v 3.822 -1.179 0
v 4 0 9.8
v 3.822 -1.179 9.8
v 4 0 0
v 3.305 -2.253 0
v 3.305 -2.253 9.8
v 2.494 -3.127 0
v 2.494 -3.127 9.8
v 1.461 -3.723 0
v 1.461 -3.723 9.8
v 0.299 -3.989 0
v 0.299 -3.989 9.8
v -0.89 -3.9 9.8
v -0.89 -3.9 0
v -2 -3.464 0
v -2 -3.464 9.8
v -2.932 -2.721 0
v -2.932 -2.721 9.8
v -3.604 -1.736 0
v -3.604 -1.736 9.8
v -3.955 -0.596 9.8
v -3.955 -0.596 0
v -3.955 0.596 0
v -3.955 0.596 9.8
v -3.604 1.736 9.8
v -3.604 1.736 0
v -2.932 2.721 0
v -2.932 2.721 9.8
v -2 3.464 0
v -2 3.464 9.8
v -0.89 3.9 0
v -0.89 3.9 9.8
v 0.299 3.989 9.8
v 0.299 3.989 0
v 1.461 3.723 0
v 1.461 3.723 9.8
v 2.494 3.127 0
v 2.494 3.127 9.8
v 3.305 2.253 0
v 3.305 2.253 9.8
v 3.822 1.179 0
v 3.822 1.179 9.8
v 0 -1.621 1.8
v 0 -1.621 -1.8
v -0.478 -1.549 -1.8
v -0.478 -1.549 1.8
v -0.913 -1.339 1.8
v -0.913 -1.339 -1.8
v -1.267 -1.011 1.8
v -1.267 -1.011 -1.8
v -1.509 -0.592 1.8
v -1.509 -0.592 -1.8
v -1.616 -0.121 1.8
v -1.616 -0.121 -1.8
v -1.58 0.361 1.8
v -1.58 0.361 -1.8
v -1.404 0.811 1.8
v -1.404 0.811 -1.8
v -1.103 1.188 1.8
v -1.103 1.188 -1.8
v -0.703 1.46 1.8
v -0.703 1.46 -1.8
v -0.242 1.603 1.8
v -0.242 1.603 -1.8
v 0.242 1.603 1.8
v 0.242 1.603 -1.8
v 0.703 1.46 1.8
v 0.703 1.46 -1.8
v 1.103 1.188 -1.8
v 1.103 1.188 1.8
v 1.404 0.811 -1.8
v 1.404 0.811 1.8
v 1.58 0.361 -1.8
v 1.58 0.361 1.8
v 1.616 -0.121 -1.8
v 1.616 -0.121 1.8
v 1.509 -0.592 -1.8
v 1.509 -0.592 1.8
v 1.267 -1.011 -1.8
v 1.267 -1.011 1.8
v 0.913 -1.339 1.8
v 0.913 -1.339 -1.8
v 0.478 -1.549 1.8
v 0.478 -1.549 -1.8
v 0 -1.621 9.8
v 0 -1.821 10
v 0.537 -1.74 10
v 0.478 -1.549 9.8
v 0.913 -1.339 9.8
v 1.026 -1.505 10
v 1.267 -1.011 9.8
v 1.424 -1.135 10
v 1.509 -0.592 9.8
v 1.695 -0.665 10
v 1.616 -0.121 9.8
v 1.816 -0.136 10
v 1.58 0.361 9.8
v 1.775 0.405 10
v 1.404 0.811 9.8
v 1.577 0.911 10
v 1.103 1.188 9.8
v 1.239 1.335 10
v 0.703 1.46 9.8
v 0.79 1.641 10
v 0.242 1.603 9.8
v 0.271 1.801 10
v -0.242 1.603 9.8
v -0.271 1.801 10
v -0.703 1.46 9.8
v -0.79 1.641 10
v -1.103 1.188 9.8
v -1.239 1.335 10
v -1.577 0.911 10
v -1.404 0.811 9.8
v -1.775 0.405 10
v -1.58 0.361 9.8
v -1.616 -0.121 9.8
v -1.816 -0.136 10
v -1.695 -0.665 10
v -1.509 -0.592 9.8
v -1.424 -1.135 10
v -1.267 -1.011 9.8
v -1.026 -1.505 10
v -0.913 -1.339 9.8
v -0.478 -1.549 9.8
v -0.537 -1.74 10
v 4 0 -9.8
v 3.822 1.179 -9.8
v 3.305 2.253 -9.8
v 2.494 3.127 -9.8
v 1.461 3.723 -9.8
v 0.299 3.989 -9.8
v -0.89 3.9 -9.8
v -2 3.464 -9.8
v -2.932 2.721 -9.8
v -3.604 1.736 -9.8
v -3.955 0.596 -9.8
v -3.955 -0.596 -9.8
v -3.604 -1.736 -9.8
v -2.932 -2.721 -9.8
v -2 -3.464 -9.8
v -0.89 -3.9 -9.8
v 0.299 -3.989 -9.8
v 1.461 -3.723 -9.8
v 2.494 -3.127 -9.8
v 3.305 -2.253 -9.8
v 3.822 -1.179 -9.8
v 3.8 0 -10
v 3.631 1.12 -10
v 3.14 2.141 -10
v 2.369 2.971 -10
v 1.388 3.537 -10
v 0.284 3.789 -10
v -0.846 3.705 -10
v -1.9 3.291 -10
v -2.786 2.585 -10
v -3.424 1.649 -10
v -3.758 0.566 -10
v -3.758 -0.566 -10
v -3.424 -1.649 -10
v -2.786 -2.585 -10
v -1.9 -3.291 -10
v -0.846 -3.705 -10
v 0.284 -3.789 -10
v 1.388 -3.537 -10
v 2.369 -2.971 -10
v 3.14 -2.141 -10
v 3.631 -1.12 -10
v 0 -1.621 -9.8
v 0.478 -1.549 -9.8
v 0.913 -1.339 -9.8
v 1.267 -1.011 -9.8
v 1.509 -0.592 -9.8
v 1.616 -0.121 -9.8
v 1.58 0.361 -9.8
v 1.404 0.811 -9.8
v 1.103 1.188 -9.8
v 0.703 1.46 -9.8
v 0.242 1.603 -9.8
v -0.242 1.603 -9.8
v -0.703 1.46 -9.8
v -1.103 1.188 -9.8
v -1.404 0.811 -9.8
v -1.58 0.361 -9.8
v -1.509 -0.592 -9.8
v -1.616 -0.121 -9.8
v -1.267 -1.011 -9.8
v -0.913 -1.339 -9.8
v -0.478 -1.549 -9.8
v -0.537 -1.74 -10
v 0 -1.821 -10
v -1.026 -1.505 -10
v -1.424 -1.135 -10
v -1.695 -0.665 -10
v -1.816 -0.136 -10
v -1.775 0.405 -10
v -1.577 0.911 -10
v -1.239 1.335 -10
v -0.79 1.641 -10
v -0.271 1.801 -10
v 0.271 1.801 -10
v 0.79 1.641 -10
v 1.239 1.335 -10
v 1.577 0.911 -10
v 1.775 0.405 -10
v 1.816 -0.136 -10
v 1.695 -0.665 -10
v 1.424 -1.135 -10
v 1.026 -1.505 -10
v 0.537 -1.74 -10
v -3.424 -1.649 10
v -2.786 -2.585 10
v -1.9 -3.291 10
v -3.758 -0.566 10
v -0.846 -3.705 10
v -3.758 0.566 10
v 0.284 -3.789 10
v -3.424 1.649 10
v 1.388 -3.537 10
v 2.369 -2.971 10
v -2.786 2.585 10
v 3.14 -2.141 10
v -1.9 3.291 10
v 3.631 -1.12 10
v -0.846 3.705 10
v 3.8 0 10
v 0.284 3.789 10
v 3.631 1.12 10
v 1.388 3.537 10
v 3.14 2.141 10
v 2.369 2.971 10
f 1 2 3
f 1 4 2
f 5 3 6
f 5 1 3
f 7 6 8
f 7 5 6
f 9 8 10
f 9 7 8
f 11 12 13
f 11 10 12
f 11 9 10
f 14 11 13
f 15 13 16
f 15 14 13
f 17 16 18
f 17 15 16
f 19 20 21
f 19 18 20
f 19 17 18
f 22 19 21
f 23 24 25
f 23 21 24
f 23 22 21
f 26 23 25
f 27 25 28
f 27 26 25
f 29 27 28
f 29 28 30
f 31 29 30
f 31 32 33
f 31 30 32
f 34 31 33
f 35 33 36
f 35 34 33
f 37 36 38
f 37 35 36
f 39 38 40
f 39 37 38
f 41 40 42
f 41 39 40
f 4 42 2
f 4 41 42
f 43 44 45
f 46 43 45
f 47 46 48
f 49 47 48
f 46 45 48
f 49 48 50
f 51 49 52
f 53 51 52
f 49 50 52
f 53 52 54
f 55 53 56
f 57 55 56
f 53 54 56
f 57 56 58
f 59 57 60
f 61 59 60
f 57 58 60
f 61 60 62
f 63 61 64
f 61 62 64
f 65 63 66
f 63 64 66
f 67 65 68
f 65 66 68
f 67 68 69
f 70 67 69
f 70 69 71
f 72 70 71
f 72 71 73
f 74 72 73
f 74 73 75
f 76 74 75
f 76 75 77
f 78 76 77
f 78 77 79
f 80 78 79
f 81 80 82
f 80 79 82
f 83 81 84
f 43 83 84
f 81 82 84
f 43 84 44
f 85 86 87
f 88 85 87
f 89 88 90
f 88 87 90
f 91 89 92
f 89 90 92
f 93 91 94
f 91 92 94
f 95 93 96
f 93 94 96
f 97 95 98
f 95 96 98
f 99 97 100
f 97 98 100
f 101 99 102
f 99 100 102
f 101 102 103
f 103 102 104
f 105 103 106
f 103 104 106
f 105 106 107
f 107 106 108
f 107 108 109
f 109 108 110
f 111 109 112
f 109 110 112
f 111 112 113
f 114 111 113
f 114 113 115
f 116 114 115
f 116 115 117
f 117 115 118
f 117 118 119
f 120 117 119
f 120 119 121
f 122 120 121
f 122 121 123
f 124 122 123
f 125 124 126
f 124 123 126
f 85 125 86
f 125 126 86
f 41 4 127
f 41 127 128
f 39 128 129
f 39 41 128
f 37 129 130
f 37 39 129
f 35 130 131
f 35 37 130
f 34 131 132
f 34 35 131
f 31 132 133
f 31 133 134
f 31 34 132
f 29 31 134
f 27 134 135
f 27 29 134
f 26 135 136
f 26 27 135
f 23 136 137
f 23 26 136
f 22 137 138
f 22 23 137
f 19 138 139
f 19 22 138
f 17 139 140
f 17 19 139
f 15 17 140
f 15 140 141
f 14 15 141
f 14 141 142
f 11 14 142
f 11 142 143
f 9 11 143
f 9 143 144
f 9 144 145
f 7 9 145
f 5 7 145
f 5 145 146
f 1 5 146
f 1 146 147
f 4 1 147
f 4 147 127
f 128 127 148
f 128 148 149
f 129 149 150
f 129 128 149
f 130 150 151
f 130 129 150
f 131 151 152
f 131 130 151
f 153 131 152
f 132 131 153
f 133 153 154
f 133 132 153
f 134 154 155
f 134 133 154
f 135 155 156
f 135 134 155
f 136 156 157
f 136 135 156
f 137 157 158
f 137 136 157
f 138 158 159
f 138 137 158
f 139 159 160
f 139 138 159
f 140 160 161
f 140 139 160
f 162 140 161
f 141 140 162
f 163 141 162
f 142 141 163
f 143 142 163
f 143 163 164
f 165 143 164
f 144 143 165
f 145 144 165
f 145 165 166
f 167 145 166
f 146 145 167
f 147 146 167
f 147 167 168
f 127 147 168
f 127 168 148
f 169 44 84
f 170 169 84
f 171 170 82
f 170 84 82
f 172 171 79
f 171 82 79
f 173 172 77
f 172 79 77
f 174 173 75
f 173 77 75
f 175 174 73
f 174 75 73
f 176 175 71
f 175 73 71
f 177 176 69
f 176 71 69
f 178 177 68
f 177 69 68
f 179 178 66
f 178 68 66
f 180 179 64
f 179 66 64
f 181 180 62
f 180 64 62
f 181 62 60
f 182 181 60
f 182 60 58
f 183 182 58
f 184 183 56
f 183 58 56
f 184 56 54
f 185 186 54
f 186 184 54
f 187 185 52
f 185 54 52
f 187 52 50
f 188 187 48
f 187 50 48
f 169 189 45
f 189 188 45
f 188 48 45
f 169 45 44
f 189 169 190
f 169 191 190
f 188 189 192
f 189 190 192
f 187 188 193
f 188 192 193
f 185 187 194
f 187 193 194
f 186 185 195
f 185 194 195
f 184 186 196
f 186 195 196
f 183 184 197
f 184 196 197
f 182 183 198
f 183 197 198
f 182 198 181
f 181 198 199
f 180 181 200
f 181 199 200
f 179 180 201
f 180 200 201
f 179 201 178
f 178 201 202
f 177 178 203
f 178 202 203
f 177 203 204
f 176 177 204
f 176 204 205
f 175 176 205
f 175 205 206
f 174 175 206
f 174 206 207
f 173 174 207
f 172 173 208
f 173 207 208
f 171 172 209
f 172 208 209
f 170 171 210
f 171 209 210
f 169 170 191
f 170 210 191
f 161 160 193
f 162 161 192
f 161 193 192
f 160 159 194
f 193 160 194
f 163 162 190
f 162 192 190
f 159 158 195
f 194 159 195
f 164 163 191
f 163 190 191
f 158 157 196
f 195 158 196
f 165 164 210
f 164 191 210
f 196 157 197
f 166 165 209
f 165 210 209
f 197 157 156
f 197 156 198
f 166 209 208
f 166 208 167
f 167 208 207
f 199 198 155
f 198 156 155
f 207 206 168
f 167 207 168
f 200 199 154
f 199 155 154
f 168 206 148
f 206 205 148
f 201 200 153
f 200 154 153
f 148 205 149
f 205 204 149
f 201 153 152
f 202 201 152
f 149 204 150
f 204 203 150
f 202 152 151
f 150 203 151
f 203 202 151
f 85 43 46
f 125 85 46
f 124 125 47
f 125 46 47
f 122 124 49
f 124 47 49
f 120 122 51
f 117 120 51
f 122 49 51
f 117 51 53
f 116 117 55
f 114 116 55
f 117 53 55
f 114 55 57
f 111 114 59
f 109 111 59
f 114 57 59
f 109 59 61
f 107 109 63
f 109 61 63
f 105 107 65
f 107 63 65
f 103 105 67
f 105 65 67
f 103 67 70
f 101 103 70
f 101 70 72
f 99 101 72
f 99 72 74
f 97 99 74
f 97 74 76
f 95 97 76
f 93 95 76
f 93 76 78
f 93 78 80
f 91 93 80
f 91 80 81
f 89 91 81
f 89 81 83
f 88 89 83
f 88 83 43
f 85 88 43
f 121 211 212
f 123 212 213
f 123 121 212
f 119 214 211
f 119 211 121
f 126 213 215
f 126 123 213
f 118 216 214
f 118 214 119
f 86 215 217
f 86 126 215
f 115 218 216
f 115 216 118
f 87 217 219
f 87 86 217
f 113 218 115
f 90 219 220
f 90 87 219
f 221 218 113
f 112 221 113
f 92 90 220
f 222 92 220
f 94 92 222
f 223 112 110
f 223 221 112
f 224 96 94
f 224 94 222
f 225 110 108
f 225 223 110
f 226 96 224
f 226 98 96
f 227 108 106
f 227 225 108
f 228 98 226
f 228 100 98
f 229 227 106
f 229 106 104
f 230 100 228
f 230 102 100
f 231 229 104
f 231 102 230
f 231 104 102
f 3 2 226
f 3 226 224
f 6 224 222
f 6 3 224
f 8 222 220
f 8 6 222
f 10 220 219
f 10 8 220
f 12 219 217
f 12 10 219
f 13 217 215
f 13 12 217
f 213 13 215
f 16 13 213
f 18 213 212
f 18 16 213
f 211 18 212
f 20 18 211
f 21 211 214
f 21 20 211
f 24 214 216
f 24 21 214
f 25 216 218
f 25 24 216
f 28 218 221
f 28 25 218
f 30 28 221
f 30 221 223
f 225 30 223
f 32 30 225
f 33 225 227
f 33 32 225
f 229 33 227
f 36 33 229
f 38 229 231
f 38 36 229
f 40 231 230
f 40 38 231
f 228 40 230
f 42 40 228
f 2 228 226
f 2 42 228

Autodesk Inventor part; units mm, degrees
ref_plane "YZ Plane" through (0, 0, 0) normal (1, 0, 0) x (0, 1, 0)
ref_plane "XZ Plane" through (0, 0, 0) normal (0, 1, 0) x (-1, 0, 0)
ref_plane "XY Plane" through (0, 0, 0) normal (0, 0, 1) x (1, 0, 0)
sketch "スケッチ1" plane through (0, 0, 0) normal (0, 0, 1) x (1, 0, 0)
  circle A0 centre (0, 0) radius 4
  dimension "d13" = 8
extrude "押し出し1" add sketch "スケッチ1" along normal mid plane 20
sketch "スケッチ2" plane through (0, 0, 10) normal (0, 0, 1) x (1, 0, 0)
  point P0 (0, 0)
  point P1 (0, 0)
hole "穴1" at (0, 0, 10) direction (0, 0, -1) diameter 3.242 depth 11.8 tip angle 118 thread size "M4x0.7" class "6H" standard "ANSI Metric M Profile"
mirror "ミラー1" about plane through (0, 0, 0) normal (0, 0, 1) of "穴1"
chamfer "面取り1" distance 0.2 angle 45 4 edges at (0, 1.621, 10) (-4, 0, 10) (-4, 0, -10) (0, 1.621, -10)
properties part number "unir-spacer4" material "鋼、炭素鋼"
